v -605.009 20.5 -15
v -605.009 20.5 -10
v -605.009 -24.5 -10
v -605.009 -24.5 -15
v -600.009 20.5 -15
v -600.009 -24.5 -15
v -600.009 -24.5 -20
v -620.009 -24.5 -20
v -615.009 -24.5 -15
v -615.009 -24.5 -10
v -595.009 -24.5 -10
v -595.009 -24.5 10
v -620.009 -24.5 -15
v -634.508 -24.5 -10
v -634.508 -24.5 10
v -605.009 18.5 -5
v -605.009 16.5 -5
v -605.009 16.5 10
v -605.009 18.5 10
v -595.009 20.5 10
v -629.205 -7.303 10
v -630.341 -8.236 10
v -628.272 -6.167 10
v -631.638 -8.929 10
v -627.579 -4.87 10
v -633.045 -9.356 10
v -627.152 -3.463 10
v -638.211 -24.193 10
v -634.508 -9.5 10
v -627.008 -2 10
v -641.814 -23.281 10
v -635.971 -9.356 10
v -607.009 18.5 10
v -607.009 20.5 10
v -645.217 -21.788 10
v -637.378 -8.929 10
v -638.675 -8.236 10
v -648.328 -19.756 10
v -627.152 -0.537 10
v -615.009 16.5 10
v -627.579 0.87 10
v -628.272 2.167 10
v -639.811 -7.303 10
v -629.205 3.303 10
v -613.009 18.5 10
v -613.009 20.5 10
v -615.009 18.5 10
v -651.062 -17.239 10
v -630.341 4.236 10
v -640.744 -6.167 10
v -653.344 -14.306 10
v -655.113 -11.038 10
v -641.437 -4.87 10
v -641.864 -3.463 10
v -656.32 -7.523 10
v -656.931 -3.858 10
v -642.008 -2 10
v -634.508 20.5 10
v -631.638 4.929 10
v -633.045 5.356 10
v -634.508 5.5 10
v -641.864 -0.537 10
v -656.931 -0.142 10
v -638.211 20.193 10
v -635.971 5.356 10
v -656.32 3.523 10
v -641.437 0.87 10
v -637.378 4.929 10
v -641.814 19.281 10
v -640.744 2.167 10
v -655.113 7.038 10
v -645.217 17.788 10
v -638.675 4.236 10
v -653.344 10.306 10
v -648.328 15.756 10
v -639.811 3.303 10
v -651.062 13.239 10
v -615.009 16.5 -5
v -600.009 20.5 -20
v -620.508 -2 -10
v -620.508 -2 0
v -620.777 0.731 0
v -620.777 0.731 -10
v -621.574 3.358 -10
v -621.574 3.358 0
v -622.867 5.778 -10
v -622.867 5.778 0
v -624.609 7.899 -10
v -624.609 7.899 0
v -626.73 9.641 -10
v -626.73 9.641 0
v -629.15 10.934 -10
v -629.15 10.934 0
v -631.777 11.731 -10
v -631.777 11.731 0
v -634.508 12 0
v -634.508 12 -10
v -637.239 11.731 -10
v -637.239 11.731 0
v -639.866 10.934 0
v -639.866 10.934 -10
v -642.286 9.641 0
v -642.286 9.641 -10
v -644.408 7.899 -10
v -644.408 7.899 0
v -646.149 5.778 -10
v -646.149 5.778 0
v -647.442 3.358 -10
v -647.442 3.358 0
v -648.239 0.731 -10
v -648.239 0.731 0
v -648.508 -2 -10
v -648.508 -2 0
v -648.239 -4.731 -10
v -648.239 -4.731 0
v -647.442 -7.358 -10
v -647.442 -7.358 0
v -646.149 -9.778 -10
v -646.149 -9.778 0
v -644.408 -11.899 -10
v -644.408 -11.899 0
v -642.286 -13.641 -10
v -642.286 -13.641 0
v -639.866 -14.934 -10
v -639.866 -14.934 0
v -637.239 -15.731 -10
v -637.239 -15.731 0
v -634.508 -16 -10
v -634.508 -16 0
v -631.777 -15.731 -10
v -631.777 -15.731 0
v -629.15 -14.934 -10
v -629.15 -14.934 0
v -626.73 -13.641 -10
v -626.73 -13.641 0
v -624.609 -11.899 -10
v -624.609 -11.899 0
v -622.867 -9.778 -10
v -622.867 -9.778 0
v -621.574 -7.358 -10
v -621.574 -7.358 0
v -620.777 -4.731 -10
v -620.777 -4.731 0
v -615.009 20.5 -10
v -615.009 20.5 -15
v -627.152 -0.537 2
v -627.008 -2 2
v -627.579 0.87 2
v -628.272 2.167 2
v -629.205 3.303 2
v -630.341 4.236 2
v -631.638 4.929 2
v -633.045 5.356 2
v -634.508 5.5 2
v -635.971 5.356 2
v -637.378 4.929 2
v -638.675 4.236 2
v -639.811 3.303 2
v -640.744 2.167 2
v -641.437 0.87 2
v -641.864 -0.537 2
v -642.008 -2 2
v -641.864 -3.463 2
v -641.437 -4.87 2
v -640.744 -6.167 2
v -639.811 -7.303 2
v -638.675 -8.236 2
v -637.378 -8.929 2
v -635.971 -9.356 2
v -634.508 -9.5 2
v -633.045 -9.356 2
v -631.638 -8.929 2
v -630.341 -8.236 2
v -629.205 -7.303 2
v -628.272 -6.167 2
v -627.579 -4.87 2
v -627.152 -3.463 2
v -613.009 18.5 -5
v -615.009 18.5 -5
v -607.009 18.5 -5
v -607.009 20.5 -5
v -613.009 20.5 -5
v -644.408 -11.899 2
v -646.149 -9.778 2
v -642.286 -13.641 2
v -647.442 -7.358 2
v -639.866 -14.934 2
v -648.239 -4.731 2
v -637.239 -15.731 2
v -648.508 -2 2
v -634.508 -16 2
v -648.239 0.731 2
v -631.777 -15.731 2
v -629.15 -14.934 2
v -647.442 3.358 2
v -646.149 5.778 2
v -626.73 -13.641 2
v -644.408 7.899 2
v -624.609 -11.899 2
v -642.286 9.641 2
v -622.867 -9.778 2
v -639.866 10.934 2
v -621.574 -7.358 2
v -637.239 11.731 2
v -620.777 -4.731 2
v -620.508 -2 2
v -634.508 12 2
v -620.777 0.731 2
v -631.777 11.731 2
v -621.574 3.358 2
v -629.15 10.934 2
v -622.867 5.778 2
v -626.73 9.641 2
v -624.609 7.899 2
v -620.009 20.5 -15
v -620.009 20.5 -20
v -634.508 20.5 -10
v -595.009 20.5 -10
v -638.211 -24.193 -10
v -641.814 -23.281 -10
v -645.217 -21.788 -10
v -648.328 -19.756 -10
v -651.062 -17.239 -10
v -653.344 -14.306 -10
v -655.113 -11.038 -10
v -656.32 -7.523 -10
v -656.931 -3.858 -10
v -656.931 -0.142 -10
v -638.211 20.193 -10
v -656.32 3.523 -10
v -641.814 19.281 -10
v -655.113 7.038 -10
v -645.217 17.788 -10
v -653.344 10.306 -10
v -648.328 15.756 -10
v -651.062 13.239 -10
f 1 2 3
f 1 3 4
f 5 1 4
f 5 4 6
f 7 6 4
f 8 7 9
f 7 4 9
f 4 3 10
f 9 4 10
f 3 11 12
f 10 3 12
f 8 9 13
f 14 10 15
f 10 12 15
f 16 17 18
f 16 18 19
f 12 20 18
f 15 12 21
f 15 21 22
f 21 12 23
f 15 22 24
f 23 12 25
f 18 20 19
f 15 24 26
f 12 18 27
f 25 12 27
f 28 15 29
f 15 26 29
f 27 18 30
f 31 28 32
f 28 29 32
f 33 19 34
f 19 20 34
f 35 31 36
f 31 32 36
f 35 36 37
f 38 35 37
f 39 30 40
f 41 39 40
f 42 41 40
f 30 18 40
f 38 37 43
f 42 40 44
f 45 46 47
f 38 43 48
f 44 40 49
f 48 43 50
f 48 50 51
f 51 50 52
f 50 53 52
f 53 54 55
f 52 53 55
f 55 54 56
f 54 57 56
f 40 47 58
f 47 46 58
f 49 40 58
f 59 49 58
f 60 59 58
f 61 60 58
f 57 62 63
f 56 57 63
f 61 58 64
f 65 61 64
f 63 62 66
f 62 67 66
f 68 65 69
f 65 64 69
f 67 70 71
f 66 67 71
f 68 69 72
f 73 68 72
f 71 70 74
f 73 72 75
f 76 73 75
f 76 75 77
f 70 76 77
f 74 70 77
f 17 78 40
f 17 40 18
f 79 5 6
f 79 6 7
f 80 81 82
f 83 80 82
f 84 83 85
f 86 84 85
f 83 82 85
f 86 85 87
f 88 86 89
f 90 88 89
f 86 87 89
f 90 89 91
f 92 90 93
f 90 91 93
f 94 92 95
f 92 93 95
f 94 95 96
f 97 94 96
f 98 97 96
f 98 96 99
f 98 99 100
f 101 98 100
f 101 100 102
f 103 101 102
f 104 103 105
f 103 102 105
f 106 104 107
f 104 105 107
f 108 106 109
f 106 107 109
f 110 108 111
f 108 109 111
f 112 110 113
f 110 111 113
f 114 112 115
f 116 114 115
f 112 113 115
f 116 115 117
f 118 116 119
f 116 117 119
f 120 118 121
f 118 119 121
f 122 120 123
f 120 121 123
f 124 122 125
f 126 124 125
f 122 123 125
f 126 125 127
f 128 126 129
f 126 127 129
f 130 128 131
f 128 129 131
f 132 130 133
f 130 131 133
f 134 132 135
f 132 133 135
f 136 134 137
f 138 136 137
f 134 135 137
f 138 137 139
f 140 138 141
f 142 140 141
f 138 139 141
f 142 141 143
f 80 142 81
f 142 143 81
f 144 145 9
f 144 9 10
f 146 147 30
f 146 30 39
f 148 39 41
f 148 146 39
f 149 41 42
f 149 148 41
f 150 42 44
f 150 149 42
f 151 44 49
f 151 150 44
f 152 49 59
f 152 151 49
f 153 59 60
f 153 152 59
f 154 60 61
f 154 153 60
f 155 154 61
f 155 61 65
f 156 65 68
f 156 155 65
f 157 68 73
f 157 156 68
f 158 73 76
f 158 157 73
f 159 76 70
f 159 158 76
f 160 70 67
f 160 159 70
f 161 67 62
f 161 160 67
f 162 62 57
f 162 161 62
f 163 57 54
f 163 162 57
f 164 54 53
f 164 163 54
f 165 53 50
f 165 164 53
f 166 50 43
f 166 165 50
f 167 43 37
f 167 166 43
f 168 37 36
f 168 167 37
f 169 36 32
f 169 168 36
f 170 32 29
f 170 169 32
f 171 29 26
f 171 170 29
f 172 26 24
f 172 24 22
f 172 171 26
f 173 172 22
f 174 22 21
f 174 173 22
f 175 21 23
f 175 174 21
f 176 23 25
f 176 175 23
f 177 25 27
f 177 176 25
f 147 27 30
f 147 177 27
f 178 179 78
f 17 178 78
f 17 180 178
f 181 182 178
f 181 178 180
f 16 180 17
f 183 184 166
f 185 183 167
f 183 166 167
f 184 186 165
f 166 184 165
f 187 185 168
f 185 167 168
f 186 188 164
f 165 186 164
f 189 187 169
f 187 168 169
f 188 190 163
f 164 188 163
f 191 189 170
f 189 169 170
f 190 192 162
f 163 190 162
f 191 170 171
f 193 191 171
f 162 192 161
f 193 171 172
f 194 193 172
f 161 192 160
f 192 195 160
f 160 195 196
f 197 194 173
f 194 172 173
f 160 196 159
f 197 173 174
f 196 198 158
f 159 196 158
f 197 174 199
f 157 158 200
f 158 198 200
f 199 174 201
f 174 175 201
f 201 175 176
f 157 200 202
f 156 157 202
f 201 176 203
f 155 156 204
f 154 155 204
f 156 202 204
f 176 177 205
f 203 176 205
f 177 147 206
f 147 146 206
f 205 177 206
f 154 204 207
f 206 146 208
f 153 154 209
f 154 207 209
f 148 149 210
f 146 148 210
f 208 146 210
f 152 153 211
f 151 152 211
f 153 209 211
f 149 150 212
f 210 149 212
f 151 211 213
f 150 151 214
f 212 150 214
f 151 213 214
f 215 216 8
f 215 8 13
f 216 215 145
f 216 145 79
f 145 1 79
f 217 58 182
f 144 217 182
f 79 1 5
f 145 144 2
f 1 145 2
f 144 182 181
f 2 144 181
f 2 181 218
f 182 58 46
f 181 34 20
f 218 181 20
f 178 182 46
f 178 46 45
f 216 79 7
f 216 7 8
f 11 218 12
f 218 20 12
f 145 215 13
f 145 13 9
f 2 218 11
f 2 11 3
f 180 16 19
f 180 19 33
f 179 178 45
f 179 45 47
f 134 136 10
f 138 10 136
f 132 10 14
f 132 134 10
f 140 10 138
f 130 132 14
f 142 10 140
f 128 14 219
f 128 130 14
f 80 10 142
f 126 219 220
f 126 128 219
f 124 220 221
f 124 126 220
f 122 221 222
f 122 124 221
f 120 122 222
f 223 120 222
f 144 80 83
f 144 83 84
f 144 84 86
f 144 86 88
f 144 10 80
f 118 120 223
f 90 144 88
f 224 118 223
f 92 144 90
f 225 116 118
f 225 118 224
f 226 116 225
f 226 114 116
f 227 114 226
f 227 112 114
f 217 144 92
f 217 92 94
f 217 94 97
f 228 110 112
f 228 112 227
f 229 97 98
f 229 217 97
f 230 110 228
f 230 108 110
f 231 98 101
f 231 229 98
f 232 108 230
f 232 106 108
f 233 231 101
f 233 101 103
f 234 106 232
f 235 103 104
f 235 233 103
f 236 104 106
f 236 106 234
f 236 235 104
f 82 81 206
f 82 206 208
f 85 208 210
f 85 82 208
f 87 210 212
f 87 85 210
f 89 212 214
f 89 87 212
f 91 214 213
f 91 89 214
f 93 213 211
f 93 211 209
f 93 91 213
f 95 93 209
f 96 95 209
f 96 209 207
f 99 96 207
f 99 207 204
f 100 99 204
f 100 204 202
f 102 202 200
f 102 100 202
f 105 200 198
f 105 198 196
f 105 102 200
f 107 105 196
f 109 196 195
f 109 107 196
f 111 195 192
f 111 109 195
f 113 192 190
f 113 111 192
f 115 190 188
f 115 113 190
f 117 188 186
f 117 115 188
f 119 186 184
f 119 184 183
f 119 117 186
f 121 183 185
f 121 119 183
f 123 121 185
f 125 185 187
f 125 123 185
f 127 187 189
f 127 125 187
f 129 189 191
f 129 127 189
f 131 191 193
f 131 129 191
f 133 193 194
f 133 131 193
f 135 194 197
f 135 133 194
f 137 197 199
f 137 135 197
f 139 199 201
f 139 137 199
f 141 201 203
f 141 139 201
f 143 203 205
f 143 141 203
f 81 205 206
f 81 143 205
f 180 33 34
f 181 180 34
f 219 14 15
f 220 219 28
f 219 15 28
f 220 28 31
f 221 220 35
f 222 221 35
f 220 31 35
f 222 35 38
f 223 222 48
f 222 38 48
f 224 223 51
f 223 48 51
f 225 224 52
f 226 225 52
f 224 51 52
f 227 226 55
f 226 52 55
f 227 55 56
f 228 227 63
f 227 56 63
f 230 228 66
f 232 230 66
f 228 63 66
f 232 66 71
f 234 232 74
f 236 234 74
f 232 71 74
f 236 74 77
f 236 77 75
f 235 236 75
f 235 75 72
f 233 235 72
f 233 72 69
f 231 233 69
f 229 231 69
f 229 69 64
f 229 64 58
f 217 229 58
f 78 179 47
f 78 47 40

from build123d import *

# Parameters (mm, degrees)
ESQUISSE1_R                  = 7.5
BOSS_EXTRU_1_DEPTH           = 10
ESQUISSE1_5_R                = 14
ENL_V_MAT_EXTRU_1_DEPTH      = 2
ENL_V_MAT_EXTRU_1_DEPTH_BACK = 10
BOSS_EXTRU_2_DEPTH           = 45
ENL_V_MAT_EXTRU_2_DEPTH      = 11
ENL_V_MAT_EXTRU_2_DEPTH_BACK = 5


with BuildPart() as part:
    # Esquisse1 → Boss.-Extru.1 (new body, symmetric)
    with BuildSketch(Plane.XY):
        with BuildLine():
            Line((-634.508066615, 20.5), (-595.008671928, 20.5))
            Line((-595.008671928, 20.5), (-595.008671928, -24.5))
            Line((-595.008671928, -24.5), (-634.508066615, -24.5))
            ThreePointArc((-634.508066615, -24.5), (-657.008066615, -2), (-634.508066615, 20.5))
        make_face()
        with Locations((-634.508066615, -2)):
            Circle(ESQUISSE1_R, mode=Mode.SUBTRACT)
    extrude(amount=BOSS_EXTRU_1_DEPTH, both=True)

    # Esquisse1_5 → Enl_v. mat.-Extru.1 (cut, two sides)
    with BuildSketch(Plane.XY) as enl_v_mat_extru_1_sk:
        with Locations((-634.508066615, -2)):
            Circle(ESQUISSE1_5_R)
    extrude(amount=ENL_V_MAT_EXTRU_1_DEPTH, mode=Mode.SUBTRACT)
    extrude(enl_v_mat_extru_1_sk.sketch, amount=-ENL_V_MAT_EXTRU_1_DEPTH_BACK, mode=Mode.SUBTRACT)

    # Esquisse2 → Boss.-Extru.2 (add)
    with BuildSketch(Plane(origin=(0, 20.5, 0), x_dir=(1, 0, 0), z_dir=(0, 1, 0))):
        Polygon((-605.008671928, 10), (-605.008671928, 15), (-600.008671928, 15), (-600.008671928, 20), (-620.008671928, 20), (-620.008671928, 15), (-615.008671928, 15), (-615.008671928, 10), align=None)
    extrude(amount=-BOSS_EXTRU_2_DEPTH)

    # Esquisse1_7 → Enl_v. mat.-Extru.2 (cut, two sides)
    with BuildSketch(Plane.XY) as enl_v_mat_extru_2_sk:
        Polygon((-607.008671928, 20.5), (-613.008671928, 20.5), (-613.008671928, 18.5), (-615.008671928, 18.5), (-615.008671928, 16.5), (-605.008671928, 16.5), (-605.008671928, 18.5), (-607.008671928, 18.5), align=None)
    extrude(amount=ENL_V_MAT_EXTRU_2_DEPTH, mode=Mode.SUBTRACT)
    extrude(enl_v_mat_extru_2_sk.sketch, amount=-ENL_V_MAT_EXTRU_2_DEPTH_BACK, mode=Mode.SUBTRACT)


solid = part.part
